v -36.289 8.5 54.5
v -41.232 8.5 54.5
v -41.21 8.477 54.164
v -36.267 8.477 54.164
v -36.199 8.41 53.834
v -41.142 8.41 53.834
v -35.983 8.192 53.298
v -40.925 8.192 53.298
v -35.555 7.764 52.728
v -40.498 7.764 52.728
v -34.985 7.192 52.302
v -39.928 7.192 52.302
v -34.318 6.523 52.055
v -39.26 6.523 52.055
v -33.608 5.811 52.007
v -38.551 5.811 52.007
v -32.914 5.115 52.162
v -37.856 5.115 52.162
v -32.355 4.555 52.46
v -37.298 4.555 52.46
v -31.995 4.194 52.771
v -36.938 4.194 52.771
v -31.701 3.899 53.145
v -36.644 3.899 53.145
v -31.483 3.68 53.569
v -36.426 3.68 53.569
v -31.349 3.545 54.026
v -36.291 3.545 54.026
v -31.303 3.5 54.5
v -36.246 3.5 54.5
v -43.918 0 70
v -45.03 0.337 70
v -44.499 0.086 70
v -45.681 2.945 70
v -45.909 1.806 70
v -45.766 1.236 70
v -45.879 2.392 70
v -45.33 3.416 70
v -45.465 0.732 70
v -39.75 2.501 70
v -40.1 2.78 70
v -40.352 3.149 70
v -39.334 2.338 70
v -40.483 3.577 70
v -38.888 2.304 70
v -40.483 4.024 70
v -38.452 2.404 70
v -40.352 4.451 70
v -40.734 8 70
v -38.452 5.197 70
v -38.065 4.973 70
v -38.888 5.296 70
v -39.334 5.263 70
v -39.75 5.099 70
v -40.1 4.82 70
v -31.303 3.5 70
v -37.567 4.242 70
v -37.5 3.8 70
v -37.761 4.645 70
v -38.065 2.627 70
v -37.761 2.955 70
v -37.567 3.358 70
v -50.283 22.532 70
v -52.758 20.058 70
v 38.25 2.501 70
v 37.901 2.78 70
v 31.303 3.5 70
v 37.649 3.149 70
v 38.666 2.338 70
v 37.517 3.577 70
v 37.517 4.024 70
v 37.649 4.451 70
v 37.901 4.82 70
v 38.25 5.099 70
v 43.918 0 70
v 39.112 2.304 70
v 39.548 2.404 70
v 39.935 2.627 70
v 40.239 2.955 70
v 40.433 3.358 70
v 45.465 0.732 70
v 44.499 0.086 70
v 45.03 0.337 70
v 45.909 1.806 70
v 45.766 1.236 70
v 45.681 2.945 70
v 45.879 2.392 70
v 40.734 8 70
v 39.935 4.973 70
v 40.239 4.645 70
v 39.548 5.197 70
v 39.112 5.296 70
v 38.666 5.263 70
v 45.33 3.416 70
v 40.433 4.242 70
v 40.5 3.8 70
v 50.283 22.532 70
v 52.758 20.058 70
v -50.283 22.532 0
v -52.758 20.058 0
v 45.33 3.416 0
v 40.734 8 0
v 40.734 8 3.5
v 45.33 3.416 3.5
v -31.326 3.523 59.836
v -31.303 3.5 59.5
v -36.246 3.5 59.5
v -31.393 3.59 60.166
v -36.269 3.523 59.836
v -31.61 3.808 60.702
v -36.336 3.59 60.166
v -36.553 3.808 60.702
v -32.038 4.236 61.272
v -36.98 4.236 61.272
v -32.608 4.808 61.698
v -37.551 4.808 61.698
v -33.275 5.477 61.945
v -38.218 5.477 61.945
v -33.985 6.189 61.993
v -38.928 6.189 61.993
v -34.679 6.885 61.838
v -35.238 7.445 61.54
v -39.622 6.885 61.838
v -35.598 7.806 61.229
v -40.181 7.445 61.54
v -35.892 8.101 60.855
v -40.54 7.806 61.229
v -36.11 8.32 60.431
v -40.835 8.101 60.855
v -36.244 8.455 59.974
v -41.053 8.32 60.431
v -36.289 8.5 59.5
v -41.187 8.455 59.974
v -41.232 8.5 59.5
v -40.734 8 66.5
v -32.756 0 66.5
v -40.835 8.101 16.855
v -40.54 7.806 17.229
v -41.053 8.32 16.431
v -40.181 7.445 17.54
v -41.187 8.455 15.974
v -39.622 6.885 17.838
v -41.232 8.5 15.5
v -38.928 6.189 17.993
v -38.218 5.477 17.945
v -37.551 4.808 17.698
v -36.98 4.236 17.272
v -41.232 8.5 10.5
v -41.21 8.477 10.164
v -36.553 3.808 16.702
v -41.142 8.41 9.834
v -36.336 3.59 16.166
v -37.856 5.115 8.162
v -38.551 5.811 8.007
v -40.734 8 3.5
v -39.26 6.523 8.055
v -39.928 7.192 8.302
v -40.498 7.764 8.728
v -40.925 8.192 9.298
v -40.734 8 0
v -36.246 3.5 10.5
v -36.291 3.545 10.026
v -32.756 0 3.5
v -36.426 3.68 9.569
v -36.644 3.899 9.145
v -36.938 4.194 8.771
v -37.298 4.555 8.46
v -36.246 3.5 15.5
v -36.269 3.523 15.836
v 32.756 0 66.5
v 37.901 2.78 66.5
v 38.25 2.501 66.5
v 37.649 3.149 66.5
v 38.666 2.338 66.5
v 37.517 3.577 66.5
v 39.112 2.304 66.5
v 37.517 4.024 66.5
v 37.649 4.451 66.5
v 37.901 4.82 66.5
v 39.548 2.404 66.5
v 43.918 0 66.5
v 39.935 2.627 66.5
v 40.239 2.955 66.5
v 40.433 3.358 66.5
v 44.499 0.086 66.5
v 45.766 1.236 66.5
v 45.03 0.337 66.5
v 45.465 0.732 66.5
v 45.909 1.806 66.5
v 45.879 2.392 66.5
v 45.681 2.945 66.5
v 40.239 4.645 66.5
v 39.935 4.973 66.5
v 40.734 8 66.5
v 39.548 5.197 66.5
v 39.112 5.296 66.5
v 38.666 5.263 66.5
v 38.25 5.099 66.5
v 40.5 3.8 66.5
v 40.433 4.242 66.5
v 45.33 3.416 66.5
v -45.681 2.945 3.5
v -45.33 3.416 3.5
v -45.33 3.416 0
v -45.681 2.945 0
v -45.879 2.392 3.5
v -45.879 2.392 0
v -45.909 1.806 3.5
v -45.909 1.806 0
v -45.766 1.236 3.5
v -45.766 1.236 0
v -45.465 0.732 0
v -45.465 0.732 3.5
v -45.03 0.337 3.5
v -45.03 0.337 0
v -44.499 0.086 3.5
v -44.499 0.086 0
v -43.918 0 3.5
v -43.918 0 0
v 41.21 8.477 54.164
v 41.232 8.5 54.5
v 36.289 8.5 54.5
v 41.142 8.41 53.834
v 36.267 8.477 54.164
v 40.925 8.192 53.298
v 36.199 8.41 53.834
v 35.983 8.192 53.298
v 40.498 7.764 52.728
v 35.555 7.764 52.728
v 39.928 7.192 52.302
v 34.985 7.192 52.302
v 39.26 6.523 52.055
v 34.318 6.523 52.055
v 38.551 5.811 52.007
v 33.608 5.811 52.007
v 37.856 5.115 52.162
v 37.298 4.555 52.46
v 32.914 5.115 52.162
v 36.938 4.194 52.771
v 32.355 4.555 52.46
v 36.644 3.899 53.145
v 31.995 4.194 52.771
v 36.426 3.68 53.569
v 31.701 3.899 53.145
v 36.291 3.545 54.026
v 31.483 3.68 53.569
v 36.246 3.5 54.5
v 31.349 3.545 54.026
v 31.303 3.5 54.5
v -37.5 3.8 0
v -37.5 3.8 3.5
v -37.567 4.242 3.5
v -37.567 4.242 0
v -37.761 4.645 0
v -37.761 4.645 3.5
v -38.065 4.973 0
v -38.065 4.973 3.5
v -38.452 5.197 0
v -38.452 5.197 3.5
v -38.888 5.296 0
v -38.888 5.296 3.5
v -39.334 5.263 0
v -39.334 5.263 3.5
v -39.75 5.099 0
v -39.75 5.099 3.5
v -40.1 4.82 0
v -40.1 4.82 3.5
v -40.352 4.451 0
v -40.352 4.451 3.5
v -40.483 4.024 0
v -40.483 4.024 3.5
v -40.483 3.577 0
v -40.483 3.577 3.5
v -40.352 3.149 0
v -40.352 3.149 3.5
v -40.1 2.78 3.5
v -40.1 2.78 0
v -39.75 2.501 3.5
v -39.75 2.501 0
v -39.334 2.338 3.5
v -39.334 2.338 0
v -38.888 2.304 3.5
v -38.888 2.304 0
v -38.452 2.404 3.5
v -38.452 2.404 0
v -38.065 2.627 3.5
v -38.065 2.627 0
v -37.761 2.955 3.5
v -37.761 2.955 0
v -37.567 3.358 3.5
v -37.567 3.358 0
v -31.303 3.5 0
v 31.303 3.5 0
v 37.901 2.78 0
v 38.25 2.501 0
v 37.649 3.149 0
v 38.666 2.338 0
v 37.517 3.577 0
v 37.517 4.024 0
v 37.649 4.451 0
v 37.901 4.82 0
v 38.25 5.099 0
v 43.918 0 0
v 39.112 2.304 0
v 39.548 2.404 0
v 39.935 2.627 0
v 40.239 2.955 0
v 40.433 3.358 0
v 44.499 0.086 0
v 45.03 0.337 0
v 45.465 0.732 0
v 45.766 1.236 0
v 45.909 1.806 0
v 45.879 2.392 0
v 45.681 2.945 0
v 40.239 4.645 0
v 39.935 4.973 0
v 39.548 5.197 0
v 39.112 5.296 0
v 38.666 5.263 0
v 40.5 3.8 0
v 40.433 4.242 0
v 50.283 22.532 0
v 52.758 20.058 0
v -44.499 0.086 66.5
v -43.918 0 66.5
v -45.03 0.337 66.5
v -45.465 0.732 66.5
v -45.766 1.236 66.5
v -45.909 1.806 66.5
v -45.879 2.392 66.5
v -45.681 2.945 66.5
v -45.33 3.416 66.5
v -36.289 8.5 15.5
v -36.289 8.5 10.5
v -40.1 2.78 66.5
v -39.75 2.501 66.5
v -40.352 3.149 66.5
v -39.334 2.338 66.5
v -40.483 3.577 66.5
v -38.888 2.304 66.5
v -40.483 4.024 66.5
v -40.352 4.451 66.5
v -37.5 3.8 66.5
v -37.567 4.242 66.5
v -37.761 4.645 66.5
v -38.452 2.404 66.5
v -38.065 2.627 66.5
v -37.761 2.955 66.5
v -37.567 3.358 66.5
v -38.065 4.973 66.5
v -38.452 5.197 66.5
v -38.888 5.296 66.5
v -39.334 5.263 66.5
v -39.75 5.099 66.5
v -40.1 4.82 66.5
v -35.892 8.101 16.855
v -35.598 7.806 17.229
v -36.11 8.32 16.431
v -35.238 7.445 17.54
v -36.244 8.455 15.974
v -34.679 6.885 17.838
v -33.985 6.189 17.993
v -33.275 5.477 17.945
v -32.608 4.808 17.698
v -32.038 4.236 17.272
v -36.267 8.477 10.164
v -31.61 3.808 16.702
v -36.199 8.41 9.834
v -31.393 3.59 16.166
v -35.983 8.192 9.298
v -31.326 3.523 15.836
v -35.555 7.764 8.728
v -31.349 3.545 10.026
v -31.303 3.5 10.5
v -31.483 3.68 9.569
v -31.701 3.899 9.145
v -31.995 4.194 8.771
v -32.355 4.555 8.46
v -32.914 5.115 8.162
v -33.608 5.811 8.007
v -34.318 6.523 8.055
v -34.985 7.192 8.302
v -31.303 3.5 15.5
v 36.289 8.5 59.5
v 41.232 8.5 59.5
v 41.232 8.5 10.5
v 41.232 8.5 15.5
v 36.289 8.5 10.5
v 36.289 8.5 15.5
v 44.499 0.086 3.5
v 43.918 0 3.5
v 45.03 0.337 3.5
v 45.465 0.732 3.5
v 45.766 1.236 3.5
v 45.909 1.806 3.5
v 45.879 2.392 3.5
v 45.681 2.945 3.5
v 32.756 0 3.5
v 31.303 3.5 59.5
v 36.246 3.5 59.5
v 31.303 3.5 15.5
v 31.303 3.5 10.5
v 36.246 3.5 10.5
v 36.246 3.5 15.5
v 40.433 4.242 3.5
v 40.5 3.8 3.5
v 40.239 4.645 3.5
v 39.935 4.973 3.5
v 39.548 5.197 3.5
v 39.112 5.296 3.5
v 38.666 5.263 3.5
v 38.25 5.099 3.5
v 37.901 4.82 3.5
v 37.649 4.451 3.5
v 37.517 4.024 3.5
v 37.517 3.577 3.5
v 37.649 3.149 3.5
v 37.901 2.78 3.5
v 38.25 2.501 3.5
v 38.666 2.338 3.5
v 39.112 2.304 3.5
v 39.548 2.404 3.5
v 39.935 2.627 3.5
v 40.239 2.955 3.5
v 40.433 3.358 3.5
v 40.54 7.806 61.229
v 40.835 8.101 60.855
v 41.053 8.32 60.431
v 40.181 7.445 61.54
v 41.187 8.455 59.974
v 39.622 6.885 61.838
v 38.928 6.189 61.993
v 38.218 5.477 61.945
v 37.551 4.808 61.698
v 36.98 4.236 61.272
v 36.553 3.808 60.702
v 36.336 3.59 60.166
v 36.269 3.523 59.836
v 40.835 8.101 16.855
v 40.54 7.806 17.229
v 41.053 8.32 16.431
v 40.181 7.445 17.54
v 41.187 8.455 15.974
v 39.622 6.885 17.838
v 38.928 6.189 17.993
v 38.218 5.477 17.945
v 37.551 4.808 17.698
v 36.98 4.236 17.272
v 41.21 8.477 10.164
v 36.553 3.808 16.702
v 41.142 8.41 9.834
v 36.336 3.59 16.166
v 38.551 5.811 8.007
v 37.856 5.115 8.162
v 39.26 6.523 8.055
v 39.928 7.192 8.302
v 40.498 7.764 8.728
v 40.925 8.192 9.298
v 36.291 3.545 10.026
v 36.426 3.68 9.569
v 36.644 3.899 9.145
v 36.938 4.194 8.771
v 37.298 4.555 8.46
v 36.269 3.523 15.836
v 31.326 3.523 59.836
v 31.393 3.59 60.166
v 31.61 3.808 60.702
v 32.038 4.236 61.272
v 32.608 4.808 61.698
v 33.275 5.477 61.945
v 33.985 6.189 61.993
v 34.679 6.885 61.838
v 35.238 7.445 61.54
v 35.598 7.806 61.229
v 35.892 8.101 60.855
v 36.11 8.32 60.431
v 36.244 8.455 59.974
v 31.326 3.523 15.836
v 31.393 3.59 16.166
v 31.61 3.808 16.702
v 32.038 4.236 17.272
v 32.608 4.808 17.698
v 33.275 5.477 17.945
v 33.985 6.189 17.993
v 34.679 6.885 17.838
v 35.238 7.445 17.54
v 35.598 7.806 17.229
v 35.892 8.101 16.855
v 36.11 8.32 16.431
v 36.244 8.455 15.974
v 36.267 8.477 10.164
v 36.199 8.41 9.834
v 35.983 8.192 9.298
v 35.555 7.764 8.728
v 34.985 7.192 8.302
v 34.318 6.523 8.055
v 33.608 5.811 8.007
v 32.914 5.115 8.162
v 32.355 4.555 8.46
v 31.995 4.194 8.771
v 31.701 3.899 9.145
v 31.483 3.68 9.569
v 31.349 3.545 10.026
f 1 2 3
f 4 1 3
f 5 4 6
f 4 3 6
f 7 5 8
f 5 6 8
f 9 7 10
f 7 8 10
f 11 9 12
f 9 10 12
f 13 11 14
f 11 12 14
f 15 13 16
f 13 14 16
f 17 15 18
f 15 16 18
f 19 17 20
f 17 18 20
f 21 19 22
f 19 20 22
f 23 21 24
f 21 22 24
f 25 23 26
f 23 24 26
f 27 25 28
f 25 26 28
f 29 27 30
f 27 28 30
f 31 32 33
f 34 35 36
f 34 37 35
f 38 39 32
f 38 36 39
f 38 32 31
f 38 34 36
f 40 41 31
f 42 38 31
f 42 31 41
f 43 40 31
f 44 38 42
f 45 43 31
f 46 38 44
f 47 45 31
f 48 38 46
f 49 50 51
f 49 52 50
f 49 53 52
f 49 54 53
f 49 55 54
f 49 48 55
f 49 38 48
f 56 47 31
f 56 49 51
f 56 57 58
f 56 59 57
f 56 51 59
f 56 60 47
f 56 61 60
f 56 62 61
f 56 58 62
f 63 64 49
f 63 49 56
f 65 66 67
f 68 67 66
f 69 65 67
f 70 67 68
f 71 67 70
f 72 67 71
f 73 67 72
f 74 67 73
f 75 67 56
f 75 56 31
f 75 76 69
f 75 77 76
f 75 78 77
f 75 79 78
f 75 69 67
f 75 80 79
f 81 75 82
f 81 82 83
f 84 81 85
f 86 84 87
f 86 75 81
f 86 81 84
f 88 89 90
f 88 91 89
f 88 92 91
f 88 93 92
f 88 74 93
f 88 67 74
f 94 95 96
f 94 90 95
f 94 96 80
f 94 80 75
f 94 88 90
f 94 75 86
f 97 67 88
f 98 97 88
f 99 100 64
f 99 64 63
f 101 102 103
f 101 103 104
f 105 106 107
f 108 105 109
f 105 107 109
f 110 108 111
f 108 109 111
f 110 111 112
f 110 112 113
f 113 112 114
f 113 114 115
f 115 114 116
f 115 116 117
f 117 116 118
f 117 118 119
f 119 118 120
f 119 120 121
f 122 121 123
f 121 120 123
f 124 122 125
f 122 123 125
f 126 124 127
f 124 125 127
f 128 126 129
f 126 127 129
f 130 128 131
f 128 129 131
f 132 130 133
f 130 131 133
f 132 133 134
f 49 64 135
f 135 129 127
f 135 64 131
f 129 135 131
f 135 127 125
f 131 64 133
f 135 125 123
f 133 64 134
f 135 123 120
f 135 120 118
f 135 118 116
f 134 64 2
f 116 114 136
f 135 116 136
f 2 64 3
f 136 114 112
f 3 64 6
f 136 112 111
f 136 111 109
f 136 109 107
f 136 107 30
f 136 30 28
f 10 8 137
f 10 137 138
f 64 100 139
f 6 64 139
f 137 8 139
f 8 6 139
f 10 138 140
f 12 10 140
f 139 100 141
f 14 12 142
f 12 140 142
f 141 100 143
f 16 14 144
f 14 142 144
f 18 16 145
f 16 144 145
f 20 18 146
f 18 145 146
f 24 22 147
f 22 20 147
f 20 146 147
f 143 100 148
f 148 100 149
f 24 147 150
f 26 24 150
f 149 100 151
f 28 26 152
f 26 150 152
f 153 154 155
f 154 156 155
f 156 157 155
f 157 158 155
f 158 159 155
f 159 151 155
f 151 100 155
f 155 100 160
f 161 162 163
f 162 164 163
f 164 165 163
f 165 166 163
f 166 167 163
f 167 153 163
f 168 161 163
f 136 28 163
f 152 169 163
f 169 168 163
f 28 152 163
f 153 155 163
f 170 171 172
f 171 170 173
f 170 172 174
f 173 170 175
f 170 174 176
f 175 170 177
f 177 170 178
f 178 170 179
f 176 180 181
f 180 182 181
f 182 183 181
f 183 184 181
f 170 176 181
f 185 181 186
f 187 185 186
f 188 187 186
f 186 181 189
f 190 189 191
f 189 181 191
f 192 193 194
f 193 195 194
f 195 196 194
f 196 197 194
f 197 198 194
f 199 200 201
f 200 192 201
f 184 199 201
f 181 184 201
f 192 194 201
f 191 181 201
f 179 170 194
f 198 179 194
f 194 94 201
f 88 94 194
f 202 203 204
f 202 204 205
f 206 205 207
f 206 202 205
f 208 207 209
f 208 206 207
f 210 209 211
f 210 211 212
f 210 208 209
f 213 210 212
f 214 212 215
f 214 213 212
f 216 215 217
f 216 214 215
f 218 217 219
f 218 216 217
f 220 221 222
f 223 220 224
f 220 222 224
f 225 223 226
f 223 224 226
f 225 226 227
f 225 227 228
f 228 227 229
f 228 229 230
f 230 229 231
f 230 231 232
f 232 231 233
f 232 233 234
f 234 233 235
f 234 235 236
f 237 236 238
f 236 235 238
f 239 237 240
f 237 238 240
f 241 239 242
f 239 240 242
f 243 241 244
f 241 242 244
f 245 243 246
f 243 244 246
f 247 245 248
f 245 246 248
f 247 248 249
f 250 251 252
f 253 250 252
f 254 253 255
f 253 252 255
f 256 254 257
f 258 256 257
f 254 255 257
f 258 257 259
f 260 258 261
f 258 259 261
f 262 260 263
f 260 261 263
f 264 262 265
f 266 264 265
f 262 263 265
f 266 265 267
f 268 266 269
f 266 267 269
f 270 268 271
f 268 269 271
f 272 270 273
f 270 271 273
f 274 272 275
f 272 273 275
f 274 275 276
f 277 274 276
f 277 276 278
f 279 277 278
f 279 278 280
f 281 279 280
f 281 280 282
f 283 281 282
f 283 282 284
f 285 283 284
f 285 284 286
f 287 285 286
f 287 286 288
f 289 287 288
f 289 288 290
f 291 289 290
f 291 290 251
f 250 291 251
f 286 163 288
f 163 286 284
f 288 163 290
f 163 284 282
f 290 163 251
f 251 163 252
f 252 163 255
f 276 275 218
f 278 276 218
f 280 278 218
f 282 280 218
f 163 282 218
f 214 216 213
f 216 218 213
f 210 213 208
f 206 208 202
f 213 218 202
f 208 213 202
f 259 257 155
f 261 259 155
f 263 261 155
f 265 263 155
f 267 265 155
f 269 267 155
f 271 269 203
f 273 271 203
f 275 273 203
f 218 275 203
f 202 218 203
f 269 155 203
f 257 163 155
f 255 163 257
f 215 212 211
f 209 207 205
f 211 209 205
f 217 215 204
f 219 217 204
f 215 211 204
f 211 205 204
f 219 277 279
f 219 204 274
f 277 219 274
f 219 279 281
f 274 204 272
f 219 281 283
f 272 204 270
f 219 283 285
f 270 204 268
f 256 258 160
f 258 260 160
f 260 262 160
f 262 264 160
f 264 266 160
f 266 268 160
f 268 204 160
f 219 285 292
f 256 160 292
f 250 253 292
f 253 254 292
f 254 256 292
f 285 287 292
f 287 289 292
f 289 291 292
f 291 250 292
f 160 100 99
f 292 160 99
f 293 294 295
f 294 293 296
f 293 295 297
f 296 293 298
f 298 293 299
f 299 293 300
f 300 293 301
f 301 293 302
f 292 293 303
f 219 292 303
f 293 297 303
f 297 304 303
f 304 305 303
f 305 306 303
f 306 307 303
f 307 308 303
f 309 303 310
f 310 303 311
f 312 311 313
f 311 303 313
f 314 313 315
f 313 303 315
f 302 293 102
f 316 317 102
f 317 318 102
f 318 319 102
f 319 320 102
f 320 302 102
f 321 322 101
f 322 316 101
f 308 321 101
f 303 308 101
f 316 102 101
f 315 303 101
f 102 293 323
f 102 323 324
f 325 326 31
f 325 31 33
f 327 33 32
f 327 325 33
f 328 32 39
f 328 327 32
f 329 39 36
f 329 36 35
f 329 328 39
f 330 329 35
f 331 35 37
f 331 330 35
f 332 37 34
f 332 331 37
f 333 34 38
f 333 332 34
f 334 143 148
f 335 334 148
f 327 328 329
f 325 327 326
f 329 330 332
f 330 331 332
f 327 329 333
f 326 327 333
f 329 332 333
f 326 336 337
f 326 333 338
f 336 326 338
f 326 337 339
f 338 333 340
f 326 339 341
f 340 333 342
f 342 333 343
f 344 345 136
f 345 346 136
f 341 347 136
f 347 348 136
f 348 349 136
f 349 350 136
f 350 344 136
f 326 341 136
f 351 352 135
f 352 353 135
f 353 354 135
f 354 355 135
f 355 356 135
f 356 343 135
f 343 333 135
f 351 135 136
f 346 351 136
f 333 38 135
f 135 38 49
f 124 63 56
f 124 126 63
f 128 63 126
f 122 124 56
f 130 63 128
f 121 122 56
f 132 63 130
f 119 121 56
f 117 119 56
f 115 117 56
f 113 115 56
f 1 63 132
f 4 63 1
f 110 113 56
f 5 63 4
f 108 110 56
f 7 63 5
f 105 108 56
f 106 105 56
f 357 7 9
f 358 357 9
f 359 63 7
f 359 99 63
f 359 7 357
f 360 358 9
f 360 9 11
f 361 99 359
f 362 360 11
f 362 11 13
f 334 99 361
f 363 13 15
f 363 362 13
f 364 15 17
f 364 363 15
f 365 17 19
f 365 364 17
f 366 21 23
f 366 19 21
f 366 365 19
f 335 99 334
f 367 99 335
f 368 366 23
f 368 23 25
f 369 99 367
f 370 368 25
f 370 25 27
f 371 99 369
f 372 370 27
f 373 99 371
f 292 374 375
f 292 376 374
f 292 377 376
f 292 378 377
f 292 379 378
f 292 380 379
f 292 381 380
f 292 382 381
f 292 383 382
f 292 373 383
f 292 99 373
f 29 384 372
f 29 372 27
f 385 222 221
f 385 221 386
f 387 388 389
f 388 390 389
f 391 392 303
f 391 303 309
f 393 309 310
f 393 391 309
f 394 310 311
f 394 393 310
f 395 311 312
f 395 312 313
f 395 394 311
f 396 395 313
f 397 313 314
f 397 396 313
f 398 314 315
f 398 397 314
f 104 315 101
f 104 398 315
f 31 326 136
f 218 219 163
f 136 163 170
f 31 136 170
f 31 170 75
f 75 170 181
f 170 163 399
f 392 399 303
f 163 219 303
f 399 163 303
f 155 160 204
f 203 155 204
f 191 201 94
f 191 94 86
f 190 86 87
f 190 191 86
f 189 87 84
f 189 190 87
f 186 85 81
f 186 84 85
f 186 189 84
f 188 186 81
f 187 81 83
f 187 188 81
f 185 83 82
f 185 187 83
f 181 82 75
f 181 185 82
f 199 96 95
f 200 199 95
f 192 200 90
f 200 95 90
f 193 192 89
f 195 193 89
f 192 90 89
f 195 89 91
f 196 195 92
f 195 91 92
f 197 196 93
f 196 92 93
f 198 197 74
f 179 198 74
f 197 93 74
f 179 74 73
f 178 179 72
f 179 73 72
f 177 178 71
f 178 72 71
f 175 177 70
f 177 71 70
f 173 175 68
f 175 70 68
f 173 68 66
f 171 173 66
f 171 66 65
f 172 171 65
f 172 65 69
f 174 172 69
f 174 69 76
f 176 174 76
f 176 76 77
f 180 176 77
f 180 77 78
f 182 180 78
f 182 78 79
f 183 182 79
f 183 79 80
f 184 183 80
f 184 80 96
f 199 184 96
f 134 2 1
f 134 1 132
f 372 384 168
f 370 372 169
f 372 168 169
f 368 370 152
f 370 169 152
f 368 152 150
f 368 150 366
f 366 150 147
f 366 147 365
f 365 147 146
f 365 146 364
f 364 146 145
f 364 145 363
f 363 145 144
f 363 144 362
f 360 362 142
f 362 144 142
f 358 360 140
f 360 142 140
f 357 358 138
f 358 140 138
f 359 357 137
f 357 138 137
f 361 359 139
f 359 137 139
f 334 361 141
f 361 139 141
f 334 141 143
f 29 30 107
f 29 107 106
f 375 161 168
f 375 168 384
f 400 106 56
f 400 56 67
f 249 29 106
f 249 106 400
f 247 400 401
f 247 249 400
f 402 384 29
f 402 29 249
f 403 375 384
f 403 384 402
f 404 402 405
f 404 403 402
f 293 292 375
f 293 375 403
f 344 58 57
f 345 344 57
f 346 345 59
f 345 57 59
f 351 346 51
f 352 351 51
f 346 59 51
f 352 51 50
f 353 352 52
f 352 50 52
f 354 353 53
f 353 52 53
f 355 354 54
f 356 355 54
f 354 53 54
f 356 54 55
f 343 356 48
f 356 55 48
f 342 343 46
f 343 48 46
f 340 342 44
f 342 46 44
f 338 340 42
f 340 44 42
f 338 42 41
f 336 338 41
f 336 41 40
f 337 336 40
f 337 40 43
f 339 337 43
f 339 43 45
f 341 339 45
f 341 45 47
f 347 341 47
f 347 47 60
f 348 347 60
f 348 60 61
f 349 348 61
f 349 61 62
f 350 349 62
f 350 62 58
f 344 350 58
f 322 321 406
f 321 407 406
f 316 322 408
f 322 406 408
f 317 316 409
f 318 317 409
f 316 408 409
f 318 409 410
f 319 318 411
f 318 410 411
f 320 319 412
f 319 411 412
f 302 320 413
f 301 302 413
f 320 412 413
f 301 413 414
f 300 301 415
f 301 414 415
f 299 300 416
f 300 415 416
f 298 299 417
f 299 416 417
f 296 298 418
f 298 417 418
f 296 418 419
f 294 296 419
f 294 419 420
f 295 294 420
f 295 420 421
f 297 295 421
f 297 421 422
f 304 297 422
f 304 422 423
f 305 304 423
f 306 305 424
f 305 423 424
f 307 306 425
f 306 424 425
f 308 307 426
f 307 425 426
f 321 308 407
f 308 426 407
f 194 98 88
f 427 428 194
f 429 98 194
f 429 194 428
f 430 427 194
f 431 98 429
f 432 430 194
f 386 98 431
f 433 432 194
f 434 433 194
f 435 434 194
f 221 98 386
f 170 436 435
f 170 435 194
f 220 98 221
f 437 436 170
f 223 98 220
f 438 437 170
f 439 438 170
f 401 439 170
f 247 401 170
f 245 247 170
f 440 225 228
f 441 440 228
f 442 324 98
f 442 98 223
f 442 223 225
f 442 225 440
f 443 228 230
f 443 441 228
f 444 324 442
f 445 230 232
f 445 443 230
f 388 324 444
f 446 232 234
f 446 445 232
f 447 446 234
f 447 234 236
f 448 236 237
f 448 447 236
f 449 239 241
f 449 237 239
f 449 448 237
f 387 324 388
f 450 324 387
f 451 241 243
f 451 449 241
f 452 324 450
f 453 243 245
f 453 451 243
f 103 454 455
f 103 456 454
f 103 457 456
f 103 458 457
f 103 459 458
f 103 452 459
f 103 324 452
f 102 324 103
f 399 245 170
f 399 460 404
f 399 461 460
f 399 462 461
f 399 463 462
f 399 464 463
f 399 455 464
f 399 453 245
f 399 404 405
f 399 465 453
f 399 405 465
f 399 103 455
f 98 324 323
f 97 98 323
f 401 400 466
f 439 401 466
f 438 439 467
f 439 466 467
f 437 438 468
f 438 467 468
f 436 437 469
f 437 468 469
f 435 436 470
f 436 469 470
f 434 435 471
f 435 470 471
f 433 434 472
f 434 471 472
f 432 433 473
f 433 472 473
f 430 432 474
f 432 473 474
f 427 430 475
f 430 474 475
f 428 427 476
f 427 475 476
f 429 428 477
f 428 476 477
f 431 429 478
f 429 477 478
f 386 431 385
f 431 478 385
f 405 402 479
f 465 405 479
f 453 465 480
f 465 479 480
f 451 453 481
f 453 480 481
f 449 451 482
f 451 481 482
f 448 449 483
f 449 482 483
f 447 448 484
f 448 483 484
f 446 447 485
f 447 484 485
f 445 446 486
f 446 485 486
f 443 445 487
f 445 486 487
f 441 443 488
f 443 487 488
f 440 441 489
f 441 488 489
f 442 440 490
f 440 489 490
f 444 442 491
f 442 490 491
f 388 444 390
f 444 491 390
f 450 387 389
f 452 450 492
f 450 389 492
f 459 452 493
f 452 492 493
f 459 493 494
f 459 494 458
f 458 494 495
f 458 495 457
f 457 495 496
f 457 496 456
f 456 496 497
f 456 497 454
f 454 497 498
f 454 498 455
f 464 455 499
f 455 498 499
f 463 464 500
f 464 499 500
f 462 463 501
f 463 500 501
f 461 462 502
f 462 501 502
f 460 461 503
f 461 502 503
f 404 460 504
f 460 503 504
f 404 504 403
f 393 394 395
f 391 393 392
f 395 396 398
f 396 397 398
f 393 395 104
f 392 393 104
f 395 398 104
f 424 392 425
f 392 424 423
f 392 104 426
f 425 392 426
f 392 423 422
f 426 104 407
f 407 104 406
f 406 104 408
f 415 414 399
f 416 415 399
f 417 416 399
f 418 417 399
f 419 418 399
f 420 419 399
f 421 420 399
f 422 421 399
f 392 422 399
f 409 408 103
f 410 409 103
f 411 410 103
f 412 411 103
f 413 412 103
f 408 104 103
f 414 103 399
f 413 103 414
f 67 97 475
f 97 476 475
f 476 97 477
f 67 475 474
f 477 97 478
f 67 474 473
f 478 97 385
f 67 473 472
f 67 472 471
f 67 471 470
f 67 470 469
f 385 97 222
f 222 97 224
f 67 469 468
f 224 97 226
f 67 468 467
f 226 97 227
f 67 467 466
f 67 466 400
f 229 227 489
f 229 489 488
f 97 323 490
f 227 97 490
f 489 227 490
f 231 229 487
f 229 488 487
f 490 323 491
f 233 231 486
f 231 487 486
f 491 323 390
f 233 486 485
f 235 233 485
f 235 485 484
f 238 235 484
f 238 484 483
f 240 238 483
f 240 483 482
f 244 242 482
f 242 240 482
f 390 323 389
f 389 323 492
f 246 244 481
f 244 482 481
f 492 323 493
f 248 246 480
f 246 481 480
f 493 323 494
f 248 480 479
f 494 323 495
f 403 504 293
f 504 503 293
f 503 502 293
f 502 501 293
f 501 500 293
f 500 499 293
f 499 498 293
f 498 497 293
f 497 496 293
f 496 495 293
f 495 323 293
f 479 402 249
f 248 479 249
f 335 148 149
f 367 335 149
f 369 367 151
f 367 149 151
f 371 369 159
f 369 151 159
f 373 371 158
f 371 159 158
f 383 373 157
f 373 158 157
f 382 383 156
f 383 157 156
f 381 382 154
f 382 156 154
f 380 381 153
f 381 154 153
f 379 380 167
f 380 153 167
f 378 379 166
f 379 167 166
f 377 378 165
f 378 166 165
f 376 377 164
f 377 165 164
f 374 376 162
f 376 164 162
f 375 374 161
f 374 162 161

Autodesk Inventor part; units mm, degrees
ref_plane "YZ Plane" through (0, 0, 0) normal (1, 0, 0) x (0, 1, 0)
ref_plane "XZ Plane" through (0, 0, 0) normal (0, 1, 0) x (-1, 0, 0)
sketch "Boceto1" plane through (0, 0, 0) normal (0, 0, 1) x (1, 0, 0)
  line L0 (-52.7575, 20.0575) -> (-32.756, 0)
  line L1 (-32.756, 0) -> (0, 0)
  line L2 (-52.7575, 20.0575) -> (-50.2826, 22.5323)
  line L3 (-52.7575, 20.0575) -> (-49.2575, 20.0575) construction
  line L4 (-50.2826, 22.5323) -> (-31.3034, 3.5)
  line L5 (-31.3034, 3.5) -> (0, 3.5)
  line L6 (0, 0) -> (0, -9.9685) construction
  line L7 (52.7575, 20.0575) -> (32.756, 0)
  line L8 (32.756, 0) -> (0, 0)
  line L9 (52.7575, 20.0575) -> (50.2826, 22.5323)
  line L10 (50.2826, 22.5323) -> (31.3034, 3.5)
  line L11 (31.3034, 3.5) -> (0, 3.5)
  dimension "d0" = 45
  dimension "d1" = 134.92
  dimension "d2" = 3.5
  dimension "d3" = 3.5
  dimension "d4" = 28.326
  dimension "d5" = 32.756
extrude "Extrusión1" add sketch "Boceto1" along normal blind 70
sketch "Boceto2" plane through (0, 0, 70) normal (0, 0, 1) x (1, 0, 0)
  line L0 (-52.7575, 20.0575) -> (-32.756, 0) projected
  line L1 (-32.756, 0) -> (-48.756, 0)
  line L2 (-48.756, 0) -> (-40.7337, 8)
  line L3 (0, 0) -> (0, -7.1041) construction
  line L4 (52.7575, 20.0575) -> (32.756, 0)
  line L5 (32.756, 0) -> (48.756, 0)
  line L6 (48.756, 0) -> (40.7337, 8)
  point P0 (-47.756, 15.0419)
  dimension "d12" = 16
extrude "Extrusión2" add sketch "Boceto2" against normal blind 3.5
ref_plane "Plano de trabajo1" through (0, 0, 35) normal (0, 0, 1) x (1, 0, 0)
mirror "Simetría1" about plane through (0, 0, 35) normal (0, 0, 1) of "Extrusión2"
sketch "Boceto3" plane through (0, 0, 70) normal (0, 0, 1) x (1, 0, 0)
  circle A0 centre (-39.0001, 3.8002) radius 1.5
  line L0 (-39.0001, 3.8002) -> (-37.7694, 5.0275) construction
  line L1 (-32.756, 0) -> (-40.7337, 8) projected
  line L2 (0, 0) -> (0, -3.5463) construction
  circle A1 centre (39.0001, 3.8002) radius 1.5
  dimension "d13" = 3
  dimension "d14" = 7.1
  dimension "d15" = 1.738
extrude "Extrusión3" cut sketch "Boceto3" against normal through all
fillet "Empalme1" radius 2 4 edges at (-48.756, 0, 68.25) (48.756, 0, 68.25) (48.756, 0, 1.75) (-48.756, 0, 1.75)
sketch "Boceto4" plane through (0, 0, 0) normal (1, 0, 0) x (0, 1, 0)
  line L0 (6, 62) -> (6, 52) construction
  line L1 (3.5, 59.5) -> (3.5, 54.5)
  line L2 (8.5, 54.5) -> (8.5, 59.5)
  arc A0 (8.5, 59.5) -> (3.5, 59.5) centre (6, 59.5) ccw
  arc A1 (3.5, 54.5) -> (8.5, 54.5) centre (6, 54.5) ccw
  line L3 (3.5, 70) -> (22.5323, 70) projected
  line L4 (3.5, 0) -> (3.5, 70) projected
  line L5 (0, 3.5) -> (0, 66.5) projected
  line L6 (0, 35) -> (-5.0365, 35) construction
  line L7 (3.5, 10.5) -> (3.5, 15.5)
  line L8 (8.5, 15.5) -> (8.5, 10.5)
  arc A2 (3.5, 10.5) -> (8.5, 10.5) centre (6, 10.5) ccw
  arc A3 (8.5, 15.5) -> (3.5, 15.5) centre (6, 15.5) ccw
  point P0 (0, 0)
  point P1 (6, 57)
  point P2 (3.5, 57)
  point P3 (3.5, 15.5)
  point P4 (3.5, 10.5)
  dimension "d19" = 10
  dimension "d20" = 5
  dimension "d21" = 8
extrude "Extrusión4" cut sketch "Boceto4" along normal through all both and the other way through all
properties part number "Soporte_electronica"
